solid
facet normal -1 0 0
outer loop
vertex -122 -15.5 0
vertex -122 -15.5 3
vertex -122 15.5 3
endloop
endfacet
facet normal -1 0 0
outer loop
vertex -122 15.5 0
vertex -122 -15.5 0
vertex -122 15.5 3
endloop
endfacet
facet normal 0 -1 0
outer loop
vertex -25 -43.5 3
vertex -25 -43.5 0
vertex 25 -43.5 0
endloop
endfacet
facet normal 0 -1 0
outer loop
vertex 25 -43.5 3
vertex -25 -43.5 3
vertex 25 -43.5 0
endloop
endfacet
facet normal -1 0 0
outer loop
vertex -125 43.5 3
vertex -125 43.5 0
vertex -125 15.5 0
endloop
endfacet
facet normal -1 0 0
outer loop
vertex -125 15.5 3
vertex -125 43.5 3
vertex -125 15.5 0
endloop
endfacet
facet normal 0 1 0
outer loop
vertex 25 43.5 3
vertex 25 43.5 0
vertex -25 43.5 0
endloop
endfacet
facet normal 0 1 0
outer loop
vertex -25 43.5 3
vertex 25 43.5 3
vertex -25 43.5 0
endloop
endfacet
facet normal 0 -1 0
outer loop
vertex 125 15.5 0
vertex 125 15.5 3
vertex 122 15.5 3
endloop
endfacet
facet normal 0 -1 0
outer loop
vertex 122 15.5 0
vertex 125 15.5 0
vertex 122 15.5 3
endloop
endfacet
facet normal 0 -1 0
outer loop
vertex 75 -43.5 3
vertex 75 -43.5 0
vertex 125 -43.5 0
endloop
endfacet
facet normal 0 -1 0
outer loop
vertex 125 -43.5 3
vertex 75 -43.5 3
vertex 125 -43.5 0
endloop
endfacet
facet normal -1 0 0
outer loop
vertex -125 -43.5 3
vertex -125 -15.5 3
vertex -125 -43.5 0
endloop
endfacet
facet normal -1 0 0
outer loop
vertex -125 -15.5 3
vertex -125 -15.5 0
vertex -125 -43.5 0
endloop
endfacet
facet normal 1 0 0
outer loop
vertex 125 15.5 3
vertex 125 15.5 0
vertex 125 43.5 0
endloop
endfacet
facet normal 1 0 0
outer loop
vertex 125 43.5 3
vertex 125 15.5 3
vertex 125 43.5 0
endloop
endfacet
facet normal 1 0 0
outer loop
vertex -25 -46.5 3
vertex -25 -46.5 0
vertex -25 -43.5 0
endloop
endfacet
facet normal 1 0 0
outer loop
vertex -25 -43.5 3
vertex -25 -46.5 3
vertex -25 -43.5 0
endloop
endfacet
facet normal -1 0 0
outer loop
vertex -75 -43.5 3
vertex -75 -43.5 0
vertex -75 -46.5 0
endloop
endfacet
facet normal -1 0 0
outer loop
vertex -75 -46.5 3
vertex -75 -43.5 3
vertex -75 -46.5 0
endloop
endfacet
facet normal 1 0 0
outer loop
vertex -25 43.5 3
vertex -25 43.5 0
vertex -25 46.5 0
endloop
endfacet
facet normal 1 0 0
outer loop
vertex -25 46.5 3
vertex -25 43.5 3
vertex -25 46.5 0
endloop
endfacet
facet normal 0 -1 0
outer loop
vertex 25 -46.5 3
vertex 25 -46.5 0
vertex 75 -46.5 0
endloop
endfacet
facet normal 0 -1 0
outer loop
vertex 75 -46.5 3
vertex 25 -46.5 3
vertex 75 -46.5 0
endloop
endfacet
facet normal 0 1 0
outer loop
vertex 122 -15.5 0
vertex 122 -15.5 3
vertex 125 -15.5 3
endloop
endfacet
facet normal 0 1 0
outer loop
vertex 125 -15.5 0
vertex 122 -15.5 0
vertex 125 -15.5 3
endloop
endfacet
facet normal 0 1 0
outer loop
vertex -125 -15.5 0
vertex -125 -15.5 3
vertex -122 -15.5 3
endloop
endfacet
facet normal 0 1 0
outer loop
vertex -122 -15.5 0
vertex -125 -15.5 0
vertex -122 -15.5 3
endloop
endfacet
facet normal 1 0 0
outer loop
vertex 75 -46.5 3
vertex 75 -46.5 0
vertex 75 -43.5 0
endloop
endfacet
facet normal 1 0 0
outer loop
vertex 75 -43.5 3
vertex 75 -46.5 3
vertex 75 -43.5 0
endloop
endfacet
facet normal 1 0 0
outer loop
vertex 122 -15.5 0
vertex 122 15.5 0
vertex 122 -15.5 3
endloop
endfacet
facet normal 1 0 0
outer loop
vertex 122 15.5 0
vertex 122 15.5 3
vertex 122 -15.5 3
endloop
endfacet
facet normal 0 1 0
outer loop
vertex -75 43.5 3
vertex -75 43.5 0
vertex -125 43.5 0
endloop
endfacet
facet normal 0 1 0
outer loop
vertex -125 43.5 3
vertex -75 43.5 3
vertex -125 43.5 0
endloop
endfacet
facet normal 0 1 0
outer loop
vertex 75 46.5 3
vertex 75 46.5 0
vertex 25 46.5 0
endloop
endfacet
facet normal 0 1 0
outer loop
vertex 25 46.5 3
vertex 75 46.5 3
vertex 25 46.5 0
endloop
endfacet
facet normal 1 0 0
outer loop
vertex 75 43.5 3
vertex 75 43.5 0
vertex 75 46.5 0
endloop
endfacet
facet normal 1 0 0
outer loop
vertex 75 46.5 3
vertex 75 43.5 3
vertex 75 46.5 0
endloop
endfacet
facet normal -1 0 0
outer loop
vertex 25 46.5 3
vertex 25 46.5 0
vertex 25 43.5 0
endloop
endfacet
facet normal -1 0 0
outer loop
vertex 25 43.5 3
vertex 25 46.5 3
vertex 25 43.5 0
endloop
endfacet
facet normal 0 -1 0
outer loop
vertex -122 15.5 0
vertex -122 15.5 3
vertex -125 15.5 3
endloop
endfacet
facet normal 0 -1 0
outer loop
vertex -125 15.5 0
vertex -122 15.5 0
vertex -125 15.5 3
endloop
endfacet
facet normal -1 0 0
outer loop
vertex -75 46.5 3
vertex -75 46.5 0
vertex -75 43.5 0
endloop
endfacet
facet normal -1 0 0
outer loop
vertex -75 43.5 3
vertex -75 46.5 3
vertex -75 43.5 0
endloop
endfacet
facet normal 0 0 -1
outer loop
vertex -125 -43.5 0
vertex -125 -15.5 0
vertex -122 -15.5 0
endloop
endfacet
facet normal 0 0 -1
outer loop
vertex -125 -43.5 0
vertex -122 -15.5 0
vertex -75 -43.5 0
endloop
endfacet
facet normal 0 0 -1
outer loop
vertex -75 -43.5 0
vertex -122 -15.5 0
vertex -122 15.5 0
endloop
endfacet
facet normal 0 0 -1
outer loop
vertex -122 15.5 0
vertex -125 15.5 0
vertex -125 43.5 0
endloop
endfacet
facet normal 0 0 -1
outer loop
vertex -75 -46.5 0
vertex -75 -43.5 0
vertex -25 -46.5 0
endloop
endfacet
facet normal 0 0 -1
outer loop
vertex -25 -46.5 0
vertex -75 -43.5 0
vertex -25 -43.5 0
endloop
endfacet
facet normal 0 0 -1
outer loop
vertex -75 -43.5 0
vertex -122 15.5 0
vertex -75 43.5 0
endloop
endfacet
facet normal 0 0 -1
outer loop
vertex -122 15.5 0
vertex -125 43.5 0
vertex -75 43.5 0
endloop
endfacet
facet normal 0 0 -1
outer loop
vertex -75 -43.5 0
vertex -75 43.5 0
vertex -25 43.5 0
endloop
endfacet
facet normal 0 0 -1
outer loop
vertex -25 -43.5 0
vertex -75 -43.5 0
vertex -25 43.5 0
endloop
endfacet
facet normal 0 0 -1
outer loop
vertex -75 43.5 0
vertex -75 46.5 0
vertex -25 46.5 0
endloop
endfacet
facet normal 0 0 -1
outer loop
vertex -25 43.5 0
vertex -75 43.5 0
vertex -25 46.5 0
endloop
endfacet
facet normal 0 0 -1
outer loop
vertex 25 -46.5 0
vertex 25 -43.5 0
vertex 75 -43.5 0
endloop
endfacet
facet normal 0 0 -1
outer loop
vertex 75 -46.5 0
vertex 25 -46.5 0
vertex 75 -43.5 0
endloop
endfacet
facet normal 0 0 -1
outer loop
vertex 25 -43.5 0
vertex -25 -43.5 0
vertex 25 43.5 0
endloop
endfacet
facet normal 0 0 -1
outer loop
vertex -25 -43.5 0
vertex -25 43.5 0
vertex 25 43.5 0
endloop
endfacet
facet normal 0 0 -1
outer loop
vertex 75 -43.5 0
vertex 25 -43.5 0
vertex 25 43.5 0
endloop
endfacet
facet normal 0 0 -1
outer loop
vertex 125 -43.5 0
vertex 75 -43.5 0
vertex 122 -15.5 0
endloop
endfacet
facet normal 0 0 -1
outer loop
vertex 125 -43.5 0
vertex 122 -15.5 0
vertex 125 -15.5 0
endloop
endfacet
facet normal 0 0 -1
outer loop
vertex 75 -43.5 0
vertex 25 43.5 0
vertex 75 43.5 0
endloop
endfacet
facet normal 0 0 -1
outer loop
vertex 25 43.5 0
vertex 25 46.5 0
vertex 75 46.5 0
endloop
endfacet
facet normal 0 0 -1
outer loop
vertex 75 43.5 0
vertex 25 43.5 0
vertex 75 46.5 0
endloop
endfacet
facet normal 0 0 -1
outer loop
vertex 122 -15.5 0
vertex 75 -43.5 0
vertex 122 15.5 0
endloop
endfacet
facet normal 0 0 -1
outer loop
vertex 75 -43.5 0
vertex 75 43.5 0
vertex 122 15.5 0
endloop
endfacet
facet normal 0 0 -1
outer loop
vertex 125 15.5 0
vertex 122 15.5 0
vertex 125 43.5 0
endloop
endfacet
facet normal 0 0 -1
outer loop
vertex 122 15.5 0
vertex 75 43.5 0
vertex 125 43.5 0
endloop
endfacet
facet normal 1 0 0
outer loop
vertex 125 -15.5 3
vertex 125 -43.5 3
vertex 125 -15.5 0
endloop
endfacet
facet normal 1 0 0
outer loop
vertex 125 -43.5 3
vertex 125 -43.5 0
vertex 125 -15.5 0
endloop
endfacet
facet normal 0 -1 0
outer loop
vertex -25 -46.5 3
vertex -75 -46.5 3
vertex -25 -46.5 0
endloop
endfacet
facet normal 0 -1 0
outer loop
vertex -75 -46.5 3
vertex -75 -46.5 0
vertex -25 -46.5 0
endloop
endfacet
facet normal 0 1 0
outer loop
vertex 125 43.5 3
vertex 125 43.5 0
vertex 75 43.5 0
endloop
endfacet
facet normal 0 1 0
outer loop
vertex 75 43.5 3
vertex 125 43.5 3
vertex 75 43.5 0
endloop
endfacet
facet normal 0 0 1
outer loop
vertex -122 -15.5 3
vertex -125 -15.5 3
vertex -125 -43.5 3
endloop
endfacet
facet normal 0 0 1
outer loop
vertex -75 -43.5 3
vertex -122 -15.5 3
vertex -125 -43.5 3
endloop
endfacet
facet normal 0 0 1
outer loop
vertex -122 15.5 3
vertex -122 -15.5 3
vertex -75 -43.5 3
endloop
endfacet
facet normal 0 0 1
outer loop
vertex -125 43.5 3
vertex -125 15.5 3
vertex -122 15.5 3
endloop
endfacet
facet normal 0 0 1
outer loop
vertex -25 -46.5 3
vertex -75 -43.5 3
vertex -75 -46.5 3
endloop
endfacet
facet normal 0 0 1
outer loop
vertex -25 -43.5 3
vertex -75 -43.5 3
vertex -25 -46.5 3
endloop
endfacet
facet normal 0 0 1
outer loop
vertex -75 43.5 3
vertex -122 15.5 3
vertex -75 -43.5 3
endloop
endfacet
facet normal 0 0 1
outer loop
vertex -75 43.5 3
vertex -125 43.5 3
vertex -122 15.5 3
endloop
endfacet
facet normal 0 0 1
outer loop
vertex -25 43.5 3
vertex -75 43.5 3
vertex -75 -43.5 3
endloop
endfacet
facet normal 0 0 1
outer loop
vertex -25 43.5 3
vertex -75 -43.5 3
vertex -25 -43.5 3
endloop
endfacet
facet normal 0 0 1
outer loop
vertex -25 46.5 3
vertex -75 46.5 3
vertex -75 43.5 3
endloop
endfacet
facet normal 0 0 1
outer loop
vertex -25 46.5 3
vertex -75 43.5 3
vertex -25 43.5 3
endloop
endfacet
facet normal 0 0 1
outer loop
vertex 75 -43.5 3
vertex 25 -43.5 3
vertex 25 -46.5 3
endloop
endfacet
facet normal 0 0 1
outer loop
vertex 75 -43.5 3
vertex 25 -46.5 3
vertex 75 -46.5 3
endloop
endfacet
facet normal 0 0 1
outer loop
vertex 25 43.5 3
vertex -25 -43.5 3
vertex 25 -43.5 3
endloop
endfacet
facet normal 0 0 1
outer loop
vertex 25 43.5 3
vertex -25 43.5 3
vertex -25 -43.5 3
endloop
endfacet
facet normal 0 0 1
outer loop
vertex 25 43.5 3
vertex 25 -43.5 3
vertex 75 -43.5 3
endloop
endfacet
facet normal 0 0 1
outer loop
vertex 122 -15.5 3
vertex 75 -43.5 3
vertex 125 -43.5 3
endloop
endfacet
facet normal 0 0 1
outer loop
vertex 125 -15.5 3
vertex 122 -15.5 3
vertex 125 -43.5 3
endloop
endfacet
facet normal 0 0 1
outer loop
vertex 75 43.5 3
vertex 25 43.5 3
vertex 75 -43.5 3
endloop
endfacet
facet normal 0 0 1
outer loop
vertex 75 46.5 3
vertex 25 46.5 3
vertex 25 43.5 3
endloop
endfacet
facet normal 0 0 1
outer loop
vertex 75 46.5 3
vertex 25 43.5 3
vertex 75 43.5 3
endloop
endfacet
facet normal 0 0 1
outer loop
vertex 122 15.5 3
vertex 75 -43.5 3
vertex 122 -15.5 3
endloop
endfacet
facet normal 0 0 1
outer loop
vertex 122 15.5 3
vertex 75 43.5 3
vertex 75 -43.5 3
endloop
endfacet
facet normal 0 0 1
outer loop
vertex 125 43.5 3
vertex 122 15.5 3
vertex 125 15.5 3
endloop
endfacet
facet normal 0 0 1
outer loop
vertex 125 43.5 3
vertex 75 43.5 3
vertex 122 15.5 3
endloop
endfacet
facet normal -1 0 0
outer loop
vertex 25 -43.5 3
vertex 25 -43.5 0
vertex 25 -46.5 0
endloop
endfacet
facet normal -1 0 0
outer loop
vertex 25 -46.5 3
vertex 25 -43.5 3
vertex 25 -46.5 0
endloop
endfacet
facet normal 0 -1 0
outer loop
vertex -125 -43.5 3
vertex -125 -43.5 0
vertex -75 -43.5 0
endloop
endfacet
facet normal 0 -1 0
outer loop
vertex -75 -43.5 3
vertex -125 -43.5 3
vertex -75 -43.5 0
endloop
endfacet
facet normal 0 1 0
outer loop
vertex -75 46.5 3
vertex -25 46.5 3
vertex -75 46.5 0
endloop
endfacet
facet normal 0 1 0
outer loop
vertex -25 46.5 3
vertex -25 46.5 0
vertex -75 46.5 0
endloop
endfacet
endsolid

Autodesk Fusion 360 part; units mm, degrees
sketch "Sketch1" plane through (0, 0, 0) normal (0, 0, 1) x (1, 0, 0)
  line L0 (125, 46.5) -> (-125, 46.5)
  line L1 (-125, 46.5) -> (-125, -46.5)
  line L2 (-125, -46.5) -> (125, -46.5)
  line L3 (125, -46.5) -> (125, 46.5)
  line L4 (125, 46.5) -> (-125, -46.5) construction
  line L5 (-125, 46.5) -> (125, -46.5) construction
  line L6 (-125, 46.5) -> (-75, 46.5)
  line L7 (-75, 46.5) -> (-75, 43.5)
  line L8 (-75, 43.5) -> (-125, 43.5)
  line L9 (-125, 43.5) -> (-125, 46.5)
  line L10 (25, 43.5) -> (-25, 43.5)
  line L11 (-25, 46.5) -> (25, 46.5)
  line L12 (25, 46.5) -> (25, 43.5)
  line L13 (-25, 43.5) -> (-25, 46.5)
  line L14 (125, 43.5) -> (75, 43.5)
  line L15 (75, 46.5) -> (125, 46.5)
  line L16 (125, 46.5) -> (125, 43.5)
  line L17 (75, 43.5) -> (75, 46.5)
  line L18 (-75, -46.5) -> (-125, -46.5)
  line L19 (-125, -43.5) -> (-75, -43.5)
  line L20 (-75, -43.5) -> (-75, -46.5)
  line L21 (-125, -46.5) -> (-125, -43.5)
  line L22 (25, -46.5) -> (-25, -46.5)
  line L23 (-25, -43.5) -> (25, -43.5)
  line L24 (25, -43.5) -> (25, -46.5)
  line L25 (-25, -46.5) -> (-25, -43.5)
  line L26 (125, -46.5) -> (75, -46.5)
  line L27 (75, -43.5) -> (125, -43.5)
  line L28 (125, -43.5) -> (125, -46.5)
  line L29 (75, -46.5) -> (75, -43.5)
  dimension "d1" = 250
  dimension "d2" = 93
  dimension "d13" = 50
  dimension "d14" = 3
  dimension "d17" = 200
  dimension "d18" = -90
extrude "Extrude3" add sketch "Sketch1" along normal blind 3 contours L0 L1 L2 L3 L7 L8 L10 L12 L13 L14 L17 L19 L20 L23 L24 L25 L27 L29
sketch "Sketch3" plane through (0, 0, 3) normal (0, 0, 1) x (-1, 0, 0)
  line L0 (-75, 46.5) -> (-75, 43.5)
  line L1 (-75, 43.5) -> (-125, 43.5)
  line L2 (-125, 43.5) -> (-125, -43.5)
  line L3 (-125, -43.5) -> (-75, -43.5)
  line L4 (-75, -43.5) -> (-75, -46.5)
  line L5 (-75, -46.5) -> (-25, -46.5)
  line L6 (-25, -46.5) -> (-25, -43.5)
  line L7 (-25, -43.5) -> (25, -43.5)
  line L8 (25, -43.5) -> (25, -46.5)
  line L9 (25, -46.5) -> (75, -46.5)
  line L10 (75, -46.5) -> (75, -43.5)
  line L11 (75, -43.5) -> (125, -43.5)
  line L12 (125, -43.5) -> (125, 43.5)
  line L13 (125, 43.5) -> (75, 43.5)
  line L14 (75, 43.5) -> (75, 46.5)
  line L15 (75, 46.5) -> (25, 46.5)
  line L16 (25, 46.5) -> (25, 43.5)
  line L17 (25, 43.5) -> (-25, 43.5)
  line L18 (-25, 43.5) -> (-25, 46.5)
  line L19 (-25, 46.5) -> (-75, 46.5)
  line L20 (-121.1564, -43.5) -> (-121.1564, -15.5) construction
  line L21 (-121.1564, 43.5) -> (-121.1564, 15.5) construction
  line L22 (-125, -15.5) -> (-122, -15.5)
  line L23 (-122, -15.5) -> (-122, 15.5)
  line L24 (-122, 15.5) -> (-125, 15.5)
  line L25 (-125, 15.5) -> (-125, -15.5)
  dimension "d21" = 28
  dimension "d22" = 28
  dimension "d23" = 3
  dimension "d24" = 31
extrude "Extrude4" cut sketch "Sketch3" against normal blind 6 contours L2 L22 L23 L24 L25
mirror "Mirror1" about plane through (0, 0, 0) normal (1, 0, 0) of "Extrude4"
sketch "Sketch4" plane through (0, 0, 3) normal (0, 0, 1) x (-1, 0, 0)
  line L0 (122, 15.5) -> (125, 15.5)
  line L1 (125, 15.5) -> (125, 43.5)
  line L2 (125, 43.5) -> (75, 43.5)
  line L3 (75, 43.5) -> (75, 46.5)
  line L4 (75, 46.5) -> (25, 46.5)
  line L5 (25, 46.5) -> (25, 43.5)
  line L6 (25, 43.5) -> (-25, 43.5)
  line L7 (-25, 43.5) -> (-25, 46.5)
  line L8 (-25, 46.5) -> (-75, 46.5)
  line L9 (-75, 46.5) -> (-75, 43.5)
  line L10 (-75, 43.5) -> (-125, 43.5)
  line L11 (-125, 43.5) -> (-125, 15.5)
  line L12 (-125, 15.5) -> (-122, 15.5)
  line L13 (-122, 15.5) -> (-122, -15.5)
  line L14 (-122, -15.5) -> (-125, -15.5)
  line L15 (-125, -15.5) -> (-125, -43.5)
  line L16 (-125, -43.5) -> (-75, -43.5)
  line L17 (-75, -43.5) -> (-75, -46.5)
  line L18 (-75, -46.5) -> (-25, -46.5)
  line L19 (-25, -46.5) -> (-25, -43.5)
  line L20 (-25, -43.5) -> (25, -43.5)
  line L21 (25, -43.5) -> (25, -46.5)
  line L22 (25, -46.5) -> (75, -46.5)
  line L23 (75, -46.5) -> (75, -43.5)
  line L24 (75, -43.5) -> (125, -43.5)
  line L25 (125, -43.5) -> (125, -15.5)
  line L26 (125, -15.5) -> (122, -15.5)
  line L27 (122, -15.5) -> (122, 15.5)
